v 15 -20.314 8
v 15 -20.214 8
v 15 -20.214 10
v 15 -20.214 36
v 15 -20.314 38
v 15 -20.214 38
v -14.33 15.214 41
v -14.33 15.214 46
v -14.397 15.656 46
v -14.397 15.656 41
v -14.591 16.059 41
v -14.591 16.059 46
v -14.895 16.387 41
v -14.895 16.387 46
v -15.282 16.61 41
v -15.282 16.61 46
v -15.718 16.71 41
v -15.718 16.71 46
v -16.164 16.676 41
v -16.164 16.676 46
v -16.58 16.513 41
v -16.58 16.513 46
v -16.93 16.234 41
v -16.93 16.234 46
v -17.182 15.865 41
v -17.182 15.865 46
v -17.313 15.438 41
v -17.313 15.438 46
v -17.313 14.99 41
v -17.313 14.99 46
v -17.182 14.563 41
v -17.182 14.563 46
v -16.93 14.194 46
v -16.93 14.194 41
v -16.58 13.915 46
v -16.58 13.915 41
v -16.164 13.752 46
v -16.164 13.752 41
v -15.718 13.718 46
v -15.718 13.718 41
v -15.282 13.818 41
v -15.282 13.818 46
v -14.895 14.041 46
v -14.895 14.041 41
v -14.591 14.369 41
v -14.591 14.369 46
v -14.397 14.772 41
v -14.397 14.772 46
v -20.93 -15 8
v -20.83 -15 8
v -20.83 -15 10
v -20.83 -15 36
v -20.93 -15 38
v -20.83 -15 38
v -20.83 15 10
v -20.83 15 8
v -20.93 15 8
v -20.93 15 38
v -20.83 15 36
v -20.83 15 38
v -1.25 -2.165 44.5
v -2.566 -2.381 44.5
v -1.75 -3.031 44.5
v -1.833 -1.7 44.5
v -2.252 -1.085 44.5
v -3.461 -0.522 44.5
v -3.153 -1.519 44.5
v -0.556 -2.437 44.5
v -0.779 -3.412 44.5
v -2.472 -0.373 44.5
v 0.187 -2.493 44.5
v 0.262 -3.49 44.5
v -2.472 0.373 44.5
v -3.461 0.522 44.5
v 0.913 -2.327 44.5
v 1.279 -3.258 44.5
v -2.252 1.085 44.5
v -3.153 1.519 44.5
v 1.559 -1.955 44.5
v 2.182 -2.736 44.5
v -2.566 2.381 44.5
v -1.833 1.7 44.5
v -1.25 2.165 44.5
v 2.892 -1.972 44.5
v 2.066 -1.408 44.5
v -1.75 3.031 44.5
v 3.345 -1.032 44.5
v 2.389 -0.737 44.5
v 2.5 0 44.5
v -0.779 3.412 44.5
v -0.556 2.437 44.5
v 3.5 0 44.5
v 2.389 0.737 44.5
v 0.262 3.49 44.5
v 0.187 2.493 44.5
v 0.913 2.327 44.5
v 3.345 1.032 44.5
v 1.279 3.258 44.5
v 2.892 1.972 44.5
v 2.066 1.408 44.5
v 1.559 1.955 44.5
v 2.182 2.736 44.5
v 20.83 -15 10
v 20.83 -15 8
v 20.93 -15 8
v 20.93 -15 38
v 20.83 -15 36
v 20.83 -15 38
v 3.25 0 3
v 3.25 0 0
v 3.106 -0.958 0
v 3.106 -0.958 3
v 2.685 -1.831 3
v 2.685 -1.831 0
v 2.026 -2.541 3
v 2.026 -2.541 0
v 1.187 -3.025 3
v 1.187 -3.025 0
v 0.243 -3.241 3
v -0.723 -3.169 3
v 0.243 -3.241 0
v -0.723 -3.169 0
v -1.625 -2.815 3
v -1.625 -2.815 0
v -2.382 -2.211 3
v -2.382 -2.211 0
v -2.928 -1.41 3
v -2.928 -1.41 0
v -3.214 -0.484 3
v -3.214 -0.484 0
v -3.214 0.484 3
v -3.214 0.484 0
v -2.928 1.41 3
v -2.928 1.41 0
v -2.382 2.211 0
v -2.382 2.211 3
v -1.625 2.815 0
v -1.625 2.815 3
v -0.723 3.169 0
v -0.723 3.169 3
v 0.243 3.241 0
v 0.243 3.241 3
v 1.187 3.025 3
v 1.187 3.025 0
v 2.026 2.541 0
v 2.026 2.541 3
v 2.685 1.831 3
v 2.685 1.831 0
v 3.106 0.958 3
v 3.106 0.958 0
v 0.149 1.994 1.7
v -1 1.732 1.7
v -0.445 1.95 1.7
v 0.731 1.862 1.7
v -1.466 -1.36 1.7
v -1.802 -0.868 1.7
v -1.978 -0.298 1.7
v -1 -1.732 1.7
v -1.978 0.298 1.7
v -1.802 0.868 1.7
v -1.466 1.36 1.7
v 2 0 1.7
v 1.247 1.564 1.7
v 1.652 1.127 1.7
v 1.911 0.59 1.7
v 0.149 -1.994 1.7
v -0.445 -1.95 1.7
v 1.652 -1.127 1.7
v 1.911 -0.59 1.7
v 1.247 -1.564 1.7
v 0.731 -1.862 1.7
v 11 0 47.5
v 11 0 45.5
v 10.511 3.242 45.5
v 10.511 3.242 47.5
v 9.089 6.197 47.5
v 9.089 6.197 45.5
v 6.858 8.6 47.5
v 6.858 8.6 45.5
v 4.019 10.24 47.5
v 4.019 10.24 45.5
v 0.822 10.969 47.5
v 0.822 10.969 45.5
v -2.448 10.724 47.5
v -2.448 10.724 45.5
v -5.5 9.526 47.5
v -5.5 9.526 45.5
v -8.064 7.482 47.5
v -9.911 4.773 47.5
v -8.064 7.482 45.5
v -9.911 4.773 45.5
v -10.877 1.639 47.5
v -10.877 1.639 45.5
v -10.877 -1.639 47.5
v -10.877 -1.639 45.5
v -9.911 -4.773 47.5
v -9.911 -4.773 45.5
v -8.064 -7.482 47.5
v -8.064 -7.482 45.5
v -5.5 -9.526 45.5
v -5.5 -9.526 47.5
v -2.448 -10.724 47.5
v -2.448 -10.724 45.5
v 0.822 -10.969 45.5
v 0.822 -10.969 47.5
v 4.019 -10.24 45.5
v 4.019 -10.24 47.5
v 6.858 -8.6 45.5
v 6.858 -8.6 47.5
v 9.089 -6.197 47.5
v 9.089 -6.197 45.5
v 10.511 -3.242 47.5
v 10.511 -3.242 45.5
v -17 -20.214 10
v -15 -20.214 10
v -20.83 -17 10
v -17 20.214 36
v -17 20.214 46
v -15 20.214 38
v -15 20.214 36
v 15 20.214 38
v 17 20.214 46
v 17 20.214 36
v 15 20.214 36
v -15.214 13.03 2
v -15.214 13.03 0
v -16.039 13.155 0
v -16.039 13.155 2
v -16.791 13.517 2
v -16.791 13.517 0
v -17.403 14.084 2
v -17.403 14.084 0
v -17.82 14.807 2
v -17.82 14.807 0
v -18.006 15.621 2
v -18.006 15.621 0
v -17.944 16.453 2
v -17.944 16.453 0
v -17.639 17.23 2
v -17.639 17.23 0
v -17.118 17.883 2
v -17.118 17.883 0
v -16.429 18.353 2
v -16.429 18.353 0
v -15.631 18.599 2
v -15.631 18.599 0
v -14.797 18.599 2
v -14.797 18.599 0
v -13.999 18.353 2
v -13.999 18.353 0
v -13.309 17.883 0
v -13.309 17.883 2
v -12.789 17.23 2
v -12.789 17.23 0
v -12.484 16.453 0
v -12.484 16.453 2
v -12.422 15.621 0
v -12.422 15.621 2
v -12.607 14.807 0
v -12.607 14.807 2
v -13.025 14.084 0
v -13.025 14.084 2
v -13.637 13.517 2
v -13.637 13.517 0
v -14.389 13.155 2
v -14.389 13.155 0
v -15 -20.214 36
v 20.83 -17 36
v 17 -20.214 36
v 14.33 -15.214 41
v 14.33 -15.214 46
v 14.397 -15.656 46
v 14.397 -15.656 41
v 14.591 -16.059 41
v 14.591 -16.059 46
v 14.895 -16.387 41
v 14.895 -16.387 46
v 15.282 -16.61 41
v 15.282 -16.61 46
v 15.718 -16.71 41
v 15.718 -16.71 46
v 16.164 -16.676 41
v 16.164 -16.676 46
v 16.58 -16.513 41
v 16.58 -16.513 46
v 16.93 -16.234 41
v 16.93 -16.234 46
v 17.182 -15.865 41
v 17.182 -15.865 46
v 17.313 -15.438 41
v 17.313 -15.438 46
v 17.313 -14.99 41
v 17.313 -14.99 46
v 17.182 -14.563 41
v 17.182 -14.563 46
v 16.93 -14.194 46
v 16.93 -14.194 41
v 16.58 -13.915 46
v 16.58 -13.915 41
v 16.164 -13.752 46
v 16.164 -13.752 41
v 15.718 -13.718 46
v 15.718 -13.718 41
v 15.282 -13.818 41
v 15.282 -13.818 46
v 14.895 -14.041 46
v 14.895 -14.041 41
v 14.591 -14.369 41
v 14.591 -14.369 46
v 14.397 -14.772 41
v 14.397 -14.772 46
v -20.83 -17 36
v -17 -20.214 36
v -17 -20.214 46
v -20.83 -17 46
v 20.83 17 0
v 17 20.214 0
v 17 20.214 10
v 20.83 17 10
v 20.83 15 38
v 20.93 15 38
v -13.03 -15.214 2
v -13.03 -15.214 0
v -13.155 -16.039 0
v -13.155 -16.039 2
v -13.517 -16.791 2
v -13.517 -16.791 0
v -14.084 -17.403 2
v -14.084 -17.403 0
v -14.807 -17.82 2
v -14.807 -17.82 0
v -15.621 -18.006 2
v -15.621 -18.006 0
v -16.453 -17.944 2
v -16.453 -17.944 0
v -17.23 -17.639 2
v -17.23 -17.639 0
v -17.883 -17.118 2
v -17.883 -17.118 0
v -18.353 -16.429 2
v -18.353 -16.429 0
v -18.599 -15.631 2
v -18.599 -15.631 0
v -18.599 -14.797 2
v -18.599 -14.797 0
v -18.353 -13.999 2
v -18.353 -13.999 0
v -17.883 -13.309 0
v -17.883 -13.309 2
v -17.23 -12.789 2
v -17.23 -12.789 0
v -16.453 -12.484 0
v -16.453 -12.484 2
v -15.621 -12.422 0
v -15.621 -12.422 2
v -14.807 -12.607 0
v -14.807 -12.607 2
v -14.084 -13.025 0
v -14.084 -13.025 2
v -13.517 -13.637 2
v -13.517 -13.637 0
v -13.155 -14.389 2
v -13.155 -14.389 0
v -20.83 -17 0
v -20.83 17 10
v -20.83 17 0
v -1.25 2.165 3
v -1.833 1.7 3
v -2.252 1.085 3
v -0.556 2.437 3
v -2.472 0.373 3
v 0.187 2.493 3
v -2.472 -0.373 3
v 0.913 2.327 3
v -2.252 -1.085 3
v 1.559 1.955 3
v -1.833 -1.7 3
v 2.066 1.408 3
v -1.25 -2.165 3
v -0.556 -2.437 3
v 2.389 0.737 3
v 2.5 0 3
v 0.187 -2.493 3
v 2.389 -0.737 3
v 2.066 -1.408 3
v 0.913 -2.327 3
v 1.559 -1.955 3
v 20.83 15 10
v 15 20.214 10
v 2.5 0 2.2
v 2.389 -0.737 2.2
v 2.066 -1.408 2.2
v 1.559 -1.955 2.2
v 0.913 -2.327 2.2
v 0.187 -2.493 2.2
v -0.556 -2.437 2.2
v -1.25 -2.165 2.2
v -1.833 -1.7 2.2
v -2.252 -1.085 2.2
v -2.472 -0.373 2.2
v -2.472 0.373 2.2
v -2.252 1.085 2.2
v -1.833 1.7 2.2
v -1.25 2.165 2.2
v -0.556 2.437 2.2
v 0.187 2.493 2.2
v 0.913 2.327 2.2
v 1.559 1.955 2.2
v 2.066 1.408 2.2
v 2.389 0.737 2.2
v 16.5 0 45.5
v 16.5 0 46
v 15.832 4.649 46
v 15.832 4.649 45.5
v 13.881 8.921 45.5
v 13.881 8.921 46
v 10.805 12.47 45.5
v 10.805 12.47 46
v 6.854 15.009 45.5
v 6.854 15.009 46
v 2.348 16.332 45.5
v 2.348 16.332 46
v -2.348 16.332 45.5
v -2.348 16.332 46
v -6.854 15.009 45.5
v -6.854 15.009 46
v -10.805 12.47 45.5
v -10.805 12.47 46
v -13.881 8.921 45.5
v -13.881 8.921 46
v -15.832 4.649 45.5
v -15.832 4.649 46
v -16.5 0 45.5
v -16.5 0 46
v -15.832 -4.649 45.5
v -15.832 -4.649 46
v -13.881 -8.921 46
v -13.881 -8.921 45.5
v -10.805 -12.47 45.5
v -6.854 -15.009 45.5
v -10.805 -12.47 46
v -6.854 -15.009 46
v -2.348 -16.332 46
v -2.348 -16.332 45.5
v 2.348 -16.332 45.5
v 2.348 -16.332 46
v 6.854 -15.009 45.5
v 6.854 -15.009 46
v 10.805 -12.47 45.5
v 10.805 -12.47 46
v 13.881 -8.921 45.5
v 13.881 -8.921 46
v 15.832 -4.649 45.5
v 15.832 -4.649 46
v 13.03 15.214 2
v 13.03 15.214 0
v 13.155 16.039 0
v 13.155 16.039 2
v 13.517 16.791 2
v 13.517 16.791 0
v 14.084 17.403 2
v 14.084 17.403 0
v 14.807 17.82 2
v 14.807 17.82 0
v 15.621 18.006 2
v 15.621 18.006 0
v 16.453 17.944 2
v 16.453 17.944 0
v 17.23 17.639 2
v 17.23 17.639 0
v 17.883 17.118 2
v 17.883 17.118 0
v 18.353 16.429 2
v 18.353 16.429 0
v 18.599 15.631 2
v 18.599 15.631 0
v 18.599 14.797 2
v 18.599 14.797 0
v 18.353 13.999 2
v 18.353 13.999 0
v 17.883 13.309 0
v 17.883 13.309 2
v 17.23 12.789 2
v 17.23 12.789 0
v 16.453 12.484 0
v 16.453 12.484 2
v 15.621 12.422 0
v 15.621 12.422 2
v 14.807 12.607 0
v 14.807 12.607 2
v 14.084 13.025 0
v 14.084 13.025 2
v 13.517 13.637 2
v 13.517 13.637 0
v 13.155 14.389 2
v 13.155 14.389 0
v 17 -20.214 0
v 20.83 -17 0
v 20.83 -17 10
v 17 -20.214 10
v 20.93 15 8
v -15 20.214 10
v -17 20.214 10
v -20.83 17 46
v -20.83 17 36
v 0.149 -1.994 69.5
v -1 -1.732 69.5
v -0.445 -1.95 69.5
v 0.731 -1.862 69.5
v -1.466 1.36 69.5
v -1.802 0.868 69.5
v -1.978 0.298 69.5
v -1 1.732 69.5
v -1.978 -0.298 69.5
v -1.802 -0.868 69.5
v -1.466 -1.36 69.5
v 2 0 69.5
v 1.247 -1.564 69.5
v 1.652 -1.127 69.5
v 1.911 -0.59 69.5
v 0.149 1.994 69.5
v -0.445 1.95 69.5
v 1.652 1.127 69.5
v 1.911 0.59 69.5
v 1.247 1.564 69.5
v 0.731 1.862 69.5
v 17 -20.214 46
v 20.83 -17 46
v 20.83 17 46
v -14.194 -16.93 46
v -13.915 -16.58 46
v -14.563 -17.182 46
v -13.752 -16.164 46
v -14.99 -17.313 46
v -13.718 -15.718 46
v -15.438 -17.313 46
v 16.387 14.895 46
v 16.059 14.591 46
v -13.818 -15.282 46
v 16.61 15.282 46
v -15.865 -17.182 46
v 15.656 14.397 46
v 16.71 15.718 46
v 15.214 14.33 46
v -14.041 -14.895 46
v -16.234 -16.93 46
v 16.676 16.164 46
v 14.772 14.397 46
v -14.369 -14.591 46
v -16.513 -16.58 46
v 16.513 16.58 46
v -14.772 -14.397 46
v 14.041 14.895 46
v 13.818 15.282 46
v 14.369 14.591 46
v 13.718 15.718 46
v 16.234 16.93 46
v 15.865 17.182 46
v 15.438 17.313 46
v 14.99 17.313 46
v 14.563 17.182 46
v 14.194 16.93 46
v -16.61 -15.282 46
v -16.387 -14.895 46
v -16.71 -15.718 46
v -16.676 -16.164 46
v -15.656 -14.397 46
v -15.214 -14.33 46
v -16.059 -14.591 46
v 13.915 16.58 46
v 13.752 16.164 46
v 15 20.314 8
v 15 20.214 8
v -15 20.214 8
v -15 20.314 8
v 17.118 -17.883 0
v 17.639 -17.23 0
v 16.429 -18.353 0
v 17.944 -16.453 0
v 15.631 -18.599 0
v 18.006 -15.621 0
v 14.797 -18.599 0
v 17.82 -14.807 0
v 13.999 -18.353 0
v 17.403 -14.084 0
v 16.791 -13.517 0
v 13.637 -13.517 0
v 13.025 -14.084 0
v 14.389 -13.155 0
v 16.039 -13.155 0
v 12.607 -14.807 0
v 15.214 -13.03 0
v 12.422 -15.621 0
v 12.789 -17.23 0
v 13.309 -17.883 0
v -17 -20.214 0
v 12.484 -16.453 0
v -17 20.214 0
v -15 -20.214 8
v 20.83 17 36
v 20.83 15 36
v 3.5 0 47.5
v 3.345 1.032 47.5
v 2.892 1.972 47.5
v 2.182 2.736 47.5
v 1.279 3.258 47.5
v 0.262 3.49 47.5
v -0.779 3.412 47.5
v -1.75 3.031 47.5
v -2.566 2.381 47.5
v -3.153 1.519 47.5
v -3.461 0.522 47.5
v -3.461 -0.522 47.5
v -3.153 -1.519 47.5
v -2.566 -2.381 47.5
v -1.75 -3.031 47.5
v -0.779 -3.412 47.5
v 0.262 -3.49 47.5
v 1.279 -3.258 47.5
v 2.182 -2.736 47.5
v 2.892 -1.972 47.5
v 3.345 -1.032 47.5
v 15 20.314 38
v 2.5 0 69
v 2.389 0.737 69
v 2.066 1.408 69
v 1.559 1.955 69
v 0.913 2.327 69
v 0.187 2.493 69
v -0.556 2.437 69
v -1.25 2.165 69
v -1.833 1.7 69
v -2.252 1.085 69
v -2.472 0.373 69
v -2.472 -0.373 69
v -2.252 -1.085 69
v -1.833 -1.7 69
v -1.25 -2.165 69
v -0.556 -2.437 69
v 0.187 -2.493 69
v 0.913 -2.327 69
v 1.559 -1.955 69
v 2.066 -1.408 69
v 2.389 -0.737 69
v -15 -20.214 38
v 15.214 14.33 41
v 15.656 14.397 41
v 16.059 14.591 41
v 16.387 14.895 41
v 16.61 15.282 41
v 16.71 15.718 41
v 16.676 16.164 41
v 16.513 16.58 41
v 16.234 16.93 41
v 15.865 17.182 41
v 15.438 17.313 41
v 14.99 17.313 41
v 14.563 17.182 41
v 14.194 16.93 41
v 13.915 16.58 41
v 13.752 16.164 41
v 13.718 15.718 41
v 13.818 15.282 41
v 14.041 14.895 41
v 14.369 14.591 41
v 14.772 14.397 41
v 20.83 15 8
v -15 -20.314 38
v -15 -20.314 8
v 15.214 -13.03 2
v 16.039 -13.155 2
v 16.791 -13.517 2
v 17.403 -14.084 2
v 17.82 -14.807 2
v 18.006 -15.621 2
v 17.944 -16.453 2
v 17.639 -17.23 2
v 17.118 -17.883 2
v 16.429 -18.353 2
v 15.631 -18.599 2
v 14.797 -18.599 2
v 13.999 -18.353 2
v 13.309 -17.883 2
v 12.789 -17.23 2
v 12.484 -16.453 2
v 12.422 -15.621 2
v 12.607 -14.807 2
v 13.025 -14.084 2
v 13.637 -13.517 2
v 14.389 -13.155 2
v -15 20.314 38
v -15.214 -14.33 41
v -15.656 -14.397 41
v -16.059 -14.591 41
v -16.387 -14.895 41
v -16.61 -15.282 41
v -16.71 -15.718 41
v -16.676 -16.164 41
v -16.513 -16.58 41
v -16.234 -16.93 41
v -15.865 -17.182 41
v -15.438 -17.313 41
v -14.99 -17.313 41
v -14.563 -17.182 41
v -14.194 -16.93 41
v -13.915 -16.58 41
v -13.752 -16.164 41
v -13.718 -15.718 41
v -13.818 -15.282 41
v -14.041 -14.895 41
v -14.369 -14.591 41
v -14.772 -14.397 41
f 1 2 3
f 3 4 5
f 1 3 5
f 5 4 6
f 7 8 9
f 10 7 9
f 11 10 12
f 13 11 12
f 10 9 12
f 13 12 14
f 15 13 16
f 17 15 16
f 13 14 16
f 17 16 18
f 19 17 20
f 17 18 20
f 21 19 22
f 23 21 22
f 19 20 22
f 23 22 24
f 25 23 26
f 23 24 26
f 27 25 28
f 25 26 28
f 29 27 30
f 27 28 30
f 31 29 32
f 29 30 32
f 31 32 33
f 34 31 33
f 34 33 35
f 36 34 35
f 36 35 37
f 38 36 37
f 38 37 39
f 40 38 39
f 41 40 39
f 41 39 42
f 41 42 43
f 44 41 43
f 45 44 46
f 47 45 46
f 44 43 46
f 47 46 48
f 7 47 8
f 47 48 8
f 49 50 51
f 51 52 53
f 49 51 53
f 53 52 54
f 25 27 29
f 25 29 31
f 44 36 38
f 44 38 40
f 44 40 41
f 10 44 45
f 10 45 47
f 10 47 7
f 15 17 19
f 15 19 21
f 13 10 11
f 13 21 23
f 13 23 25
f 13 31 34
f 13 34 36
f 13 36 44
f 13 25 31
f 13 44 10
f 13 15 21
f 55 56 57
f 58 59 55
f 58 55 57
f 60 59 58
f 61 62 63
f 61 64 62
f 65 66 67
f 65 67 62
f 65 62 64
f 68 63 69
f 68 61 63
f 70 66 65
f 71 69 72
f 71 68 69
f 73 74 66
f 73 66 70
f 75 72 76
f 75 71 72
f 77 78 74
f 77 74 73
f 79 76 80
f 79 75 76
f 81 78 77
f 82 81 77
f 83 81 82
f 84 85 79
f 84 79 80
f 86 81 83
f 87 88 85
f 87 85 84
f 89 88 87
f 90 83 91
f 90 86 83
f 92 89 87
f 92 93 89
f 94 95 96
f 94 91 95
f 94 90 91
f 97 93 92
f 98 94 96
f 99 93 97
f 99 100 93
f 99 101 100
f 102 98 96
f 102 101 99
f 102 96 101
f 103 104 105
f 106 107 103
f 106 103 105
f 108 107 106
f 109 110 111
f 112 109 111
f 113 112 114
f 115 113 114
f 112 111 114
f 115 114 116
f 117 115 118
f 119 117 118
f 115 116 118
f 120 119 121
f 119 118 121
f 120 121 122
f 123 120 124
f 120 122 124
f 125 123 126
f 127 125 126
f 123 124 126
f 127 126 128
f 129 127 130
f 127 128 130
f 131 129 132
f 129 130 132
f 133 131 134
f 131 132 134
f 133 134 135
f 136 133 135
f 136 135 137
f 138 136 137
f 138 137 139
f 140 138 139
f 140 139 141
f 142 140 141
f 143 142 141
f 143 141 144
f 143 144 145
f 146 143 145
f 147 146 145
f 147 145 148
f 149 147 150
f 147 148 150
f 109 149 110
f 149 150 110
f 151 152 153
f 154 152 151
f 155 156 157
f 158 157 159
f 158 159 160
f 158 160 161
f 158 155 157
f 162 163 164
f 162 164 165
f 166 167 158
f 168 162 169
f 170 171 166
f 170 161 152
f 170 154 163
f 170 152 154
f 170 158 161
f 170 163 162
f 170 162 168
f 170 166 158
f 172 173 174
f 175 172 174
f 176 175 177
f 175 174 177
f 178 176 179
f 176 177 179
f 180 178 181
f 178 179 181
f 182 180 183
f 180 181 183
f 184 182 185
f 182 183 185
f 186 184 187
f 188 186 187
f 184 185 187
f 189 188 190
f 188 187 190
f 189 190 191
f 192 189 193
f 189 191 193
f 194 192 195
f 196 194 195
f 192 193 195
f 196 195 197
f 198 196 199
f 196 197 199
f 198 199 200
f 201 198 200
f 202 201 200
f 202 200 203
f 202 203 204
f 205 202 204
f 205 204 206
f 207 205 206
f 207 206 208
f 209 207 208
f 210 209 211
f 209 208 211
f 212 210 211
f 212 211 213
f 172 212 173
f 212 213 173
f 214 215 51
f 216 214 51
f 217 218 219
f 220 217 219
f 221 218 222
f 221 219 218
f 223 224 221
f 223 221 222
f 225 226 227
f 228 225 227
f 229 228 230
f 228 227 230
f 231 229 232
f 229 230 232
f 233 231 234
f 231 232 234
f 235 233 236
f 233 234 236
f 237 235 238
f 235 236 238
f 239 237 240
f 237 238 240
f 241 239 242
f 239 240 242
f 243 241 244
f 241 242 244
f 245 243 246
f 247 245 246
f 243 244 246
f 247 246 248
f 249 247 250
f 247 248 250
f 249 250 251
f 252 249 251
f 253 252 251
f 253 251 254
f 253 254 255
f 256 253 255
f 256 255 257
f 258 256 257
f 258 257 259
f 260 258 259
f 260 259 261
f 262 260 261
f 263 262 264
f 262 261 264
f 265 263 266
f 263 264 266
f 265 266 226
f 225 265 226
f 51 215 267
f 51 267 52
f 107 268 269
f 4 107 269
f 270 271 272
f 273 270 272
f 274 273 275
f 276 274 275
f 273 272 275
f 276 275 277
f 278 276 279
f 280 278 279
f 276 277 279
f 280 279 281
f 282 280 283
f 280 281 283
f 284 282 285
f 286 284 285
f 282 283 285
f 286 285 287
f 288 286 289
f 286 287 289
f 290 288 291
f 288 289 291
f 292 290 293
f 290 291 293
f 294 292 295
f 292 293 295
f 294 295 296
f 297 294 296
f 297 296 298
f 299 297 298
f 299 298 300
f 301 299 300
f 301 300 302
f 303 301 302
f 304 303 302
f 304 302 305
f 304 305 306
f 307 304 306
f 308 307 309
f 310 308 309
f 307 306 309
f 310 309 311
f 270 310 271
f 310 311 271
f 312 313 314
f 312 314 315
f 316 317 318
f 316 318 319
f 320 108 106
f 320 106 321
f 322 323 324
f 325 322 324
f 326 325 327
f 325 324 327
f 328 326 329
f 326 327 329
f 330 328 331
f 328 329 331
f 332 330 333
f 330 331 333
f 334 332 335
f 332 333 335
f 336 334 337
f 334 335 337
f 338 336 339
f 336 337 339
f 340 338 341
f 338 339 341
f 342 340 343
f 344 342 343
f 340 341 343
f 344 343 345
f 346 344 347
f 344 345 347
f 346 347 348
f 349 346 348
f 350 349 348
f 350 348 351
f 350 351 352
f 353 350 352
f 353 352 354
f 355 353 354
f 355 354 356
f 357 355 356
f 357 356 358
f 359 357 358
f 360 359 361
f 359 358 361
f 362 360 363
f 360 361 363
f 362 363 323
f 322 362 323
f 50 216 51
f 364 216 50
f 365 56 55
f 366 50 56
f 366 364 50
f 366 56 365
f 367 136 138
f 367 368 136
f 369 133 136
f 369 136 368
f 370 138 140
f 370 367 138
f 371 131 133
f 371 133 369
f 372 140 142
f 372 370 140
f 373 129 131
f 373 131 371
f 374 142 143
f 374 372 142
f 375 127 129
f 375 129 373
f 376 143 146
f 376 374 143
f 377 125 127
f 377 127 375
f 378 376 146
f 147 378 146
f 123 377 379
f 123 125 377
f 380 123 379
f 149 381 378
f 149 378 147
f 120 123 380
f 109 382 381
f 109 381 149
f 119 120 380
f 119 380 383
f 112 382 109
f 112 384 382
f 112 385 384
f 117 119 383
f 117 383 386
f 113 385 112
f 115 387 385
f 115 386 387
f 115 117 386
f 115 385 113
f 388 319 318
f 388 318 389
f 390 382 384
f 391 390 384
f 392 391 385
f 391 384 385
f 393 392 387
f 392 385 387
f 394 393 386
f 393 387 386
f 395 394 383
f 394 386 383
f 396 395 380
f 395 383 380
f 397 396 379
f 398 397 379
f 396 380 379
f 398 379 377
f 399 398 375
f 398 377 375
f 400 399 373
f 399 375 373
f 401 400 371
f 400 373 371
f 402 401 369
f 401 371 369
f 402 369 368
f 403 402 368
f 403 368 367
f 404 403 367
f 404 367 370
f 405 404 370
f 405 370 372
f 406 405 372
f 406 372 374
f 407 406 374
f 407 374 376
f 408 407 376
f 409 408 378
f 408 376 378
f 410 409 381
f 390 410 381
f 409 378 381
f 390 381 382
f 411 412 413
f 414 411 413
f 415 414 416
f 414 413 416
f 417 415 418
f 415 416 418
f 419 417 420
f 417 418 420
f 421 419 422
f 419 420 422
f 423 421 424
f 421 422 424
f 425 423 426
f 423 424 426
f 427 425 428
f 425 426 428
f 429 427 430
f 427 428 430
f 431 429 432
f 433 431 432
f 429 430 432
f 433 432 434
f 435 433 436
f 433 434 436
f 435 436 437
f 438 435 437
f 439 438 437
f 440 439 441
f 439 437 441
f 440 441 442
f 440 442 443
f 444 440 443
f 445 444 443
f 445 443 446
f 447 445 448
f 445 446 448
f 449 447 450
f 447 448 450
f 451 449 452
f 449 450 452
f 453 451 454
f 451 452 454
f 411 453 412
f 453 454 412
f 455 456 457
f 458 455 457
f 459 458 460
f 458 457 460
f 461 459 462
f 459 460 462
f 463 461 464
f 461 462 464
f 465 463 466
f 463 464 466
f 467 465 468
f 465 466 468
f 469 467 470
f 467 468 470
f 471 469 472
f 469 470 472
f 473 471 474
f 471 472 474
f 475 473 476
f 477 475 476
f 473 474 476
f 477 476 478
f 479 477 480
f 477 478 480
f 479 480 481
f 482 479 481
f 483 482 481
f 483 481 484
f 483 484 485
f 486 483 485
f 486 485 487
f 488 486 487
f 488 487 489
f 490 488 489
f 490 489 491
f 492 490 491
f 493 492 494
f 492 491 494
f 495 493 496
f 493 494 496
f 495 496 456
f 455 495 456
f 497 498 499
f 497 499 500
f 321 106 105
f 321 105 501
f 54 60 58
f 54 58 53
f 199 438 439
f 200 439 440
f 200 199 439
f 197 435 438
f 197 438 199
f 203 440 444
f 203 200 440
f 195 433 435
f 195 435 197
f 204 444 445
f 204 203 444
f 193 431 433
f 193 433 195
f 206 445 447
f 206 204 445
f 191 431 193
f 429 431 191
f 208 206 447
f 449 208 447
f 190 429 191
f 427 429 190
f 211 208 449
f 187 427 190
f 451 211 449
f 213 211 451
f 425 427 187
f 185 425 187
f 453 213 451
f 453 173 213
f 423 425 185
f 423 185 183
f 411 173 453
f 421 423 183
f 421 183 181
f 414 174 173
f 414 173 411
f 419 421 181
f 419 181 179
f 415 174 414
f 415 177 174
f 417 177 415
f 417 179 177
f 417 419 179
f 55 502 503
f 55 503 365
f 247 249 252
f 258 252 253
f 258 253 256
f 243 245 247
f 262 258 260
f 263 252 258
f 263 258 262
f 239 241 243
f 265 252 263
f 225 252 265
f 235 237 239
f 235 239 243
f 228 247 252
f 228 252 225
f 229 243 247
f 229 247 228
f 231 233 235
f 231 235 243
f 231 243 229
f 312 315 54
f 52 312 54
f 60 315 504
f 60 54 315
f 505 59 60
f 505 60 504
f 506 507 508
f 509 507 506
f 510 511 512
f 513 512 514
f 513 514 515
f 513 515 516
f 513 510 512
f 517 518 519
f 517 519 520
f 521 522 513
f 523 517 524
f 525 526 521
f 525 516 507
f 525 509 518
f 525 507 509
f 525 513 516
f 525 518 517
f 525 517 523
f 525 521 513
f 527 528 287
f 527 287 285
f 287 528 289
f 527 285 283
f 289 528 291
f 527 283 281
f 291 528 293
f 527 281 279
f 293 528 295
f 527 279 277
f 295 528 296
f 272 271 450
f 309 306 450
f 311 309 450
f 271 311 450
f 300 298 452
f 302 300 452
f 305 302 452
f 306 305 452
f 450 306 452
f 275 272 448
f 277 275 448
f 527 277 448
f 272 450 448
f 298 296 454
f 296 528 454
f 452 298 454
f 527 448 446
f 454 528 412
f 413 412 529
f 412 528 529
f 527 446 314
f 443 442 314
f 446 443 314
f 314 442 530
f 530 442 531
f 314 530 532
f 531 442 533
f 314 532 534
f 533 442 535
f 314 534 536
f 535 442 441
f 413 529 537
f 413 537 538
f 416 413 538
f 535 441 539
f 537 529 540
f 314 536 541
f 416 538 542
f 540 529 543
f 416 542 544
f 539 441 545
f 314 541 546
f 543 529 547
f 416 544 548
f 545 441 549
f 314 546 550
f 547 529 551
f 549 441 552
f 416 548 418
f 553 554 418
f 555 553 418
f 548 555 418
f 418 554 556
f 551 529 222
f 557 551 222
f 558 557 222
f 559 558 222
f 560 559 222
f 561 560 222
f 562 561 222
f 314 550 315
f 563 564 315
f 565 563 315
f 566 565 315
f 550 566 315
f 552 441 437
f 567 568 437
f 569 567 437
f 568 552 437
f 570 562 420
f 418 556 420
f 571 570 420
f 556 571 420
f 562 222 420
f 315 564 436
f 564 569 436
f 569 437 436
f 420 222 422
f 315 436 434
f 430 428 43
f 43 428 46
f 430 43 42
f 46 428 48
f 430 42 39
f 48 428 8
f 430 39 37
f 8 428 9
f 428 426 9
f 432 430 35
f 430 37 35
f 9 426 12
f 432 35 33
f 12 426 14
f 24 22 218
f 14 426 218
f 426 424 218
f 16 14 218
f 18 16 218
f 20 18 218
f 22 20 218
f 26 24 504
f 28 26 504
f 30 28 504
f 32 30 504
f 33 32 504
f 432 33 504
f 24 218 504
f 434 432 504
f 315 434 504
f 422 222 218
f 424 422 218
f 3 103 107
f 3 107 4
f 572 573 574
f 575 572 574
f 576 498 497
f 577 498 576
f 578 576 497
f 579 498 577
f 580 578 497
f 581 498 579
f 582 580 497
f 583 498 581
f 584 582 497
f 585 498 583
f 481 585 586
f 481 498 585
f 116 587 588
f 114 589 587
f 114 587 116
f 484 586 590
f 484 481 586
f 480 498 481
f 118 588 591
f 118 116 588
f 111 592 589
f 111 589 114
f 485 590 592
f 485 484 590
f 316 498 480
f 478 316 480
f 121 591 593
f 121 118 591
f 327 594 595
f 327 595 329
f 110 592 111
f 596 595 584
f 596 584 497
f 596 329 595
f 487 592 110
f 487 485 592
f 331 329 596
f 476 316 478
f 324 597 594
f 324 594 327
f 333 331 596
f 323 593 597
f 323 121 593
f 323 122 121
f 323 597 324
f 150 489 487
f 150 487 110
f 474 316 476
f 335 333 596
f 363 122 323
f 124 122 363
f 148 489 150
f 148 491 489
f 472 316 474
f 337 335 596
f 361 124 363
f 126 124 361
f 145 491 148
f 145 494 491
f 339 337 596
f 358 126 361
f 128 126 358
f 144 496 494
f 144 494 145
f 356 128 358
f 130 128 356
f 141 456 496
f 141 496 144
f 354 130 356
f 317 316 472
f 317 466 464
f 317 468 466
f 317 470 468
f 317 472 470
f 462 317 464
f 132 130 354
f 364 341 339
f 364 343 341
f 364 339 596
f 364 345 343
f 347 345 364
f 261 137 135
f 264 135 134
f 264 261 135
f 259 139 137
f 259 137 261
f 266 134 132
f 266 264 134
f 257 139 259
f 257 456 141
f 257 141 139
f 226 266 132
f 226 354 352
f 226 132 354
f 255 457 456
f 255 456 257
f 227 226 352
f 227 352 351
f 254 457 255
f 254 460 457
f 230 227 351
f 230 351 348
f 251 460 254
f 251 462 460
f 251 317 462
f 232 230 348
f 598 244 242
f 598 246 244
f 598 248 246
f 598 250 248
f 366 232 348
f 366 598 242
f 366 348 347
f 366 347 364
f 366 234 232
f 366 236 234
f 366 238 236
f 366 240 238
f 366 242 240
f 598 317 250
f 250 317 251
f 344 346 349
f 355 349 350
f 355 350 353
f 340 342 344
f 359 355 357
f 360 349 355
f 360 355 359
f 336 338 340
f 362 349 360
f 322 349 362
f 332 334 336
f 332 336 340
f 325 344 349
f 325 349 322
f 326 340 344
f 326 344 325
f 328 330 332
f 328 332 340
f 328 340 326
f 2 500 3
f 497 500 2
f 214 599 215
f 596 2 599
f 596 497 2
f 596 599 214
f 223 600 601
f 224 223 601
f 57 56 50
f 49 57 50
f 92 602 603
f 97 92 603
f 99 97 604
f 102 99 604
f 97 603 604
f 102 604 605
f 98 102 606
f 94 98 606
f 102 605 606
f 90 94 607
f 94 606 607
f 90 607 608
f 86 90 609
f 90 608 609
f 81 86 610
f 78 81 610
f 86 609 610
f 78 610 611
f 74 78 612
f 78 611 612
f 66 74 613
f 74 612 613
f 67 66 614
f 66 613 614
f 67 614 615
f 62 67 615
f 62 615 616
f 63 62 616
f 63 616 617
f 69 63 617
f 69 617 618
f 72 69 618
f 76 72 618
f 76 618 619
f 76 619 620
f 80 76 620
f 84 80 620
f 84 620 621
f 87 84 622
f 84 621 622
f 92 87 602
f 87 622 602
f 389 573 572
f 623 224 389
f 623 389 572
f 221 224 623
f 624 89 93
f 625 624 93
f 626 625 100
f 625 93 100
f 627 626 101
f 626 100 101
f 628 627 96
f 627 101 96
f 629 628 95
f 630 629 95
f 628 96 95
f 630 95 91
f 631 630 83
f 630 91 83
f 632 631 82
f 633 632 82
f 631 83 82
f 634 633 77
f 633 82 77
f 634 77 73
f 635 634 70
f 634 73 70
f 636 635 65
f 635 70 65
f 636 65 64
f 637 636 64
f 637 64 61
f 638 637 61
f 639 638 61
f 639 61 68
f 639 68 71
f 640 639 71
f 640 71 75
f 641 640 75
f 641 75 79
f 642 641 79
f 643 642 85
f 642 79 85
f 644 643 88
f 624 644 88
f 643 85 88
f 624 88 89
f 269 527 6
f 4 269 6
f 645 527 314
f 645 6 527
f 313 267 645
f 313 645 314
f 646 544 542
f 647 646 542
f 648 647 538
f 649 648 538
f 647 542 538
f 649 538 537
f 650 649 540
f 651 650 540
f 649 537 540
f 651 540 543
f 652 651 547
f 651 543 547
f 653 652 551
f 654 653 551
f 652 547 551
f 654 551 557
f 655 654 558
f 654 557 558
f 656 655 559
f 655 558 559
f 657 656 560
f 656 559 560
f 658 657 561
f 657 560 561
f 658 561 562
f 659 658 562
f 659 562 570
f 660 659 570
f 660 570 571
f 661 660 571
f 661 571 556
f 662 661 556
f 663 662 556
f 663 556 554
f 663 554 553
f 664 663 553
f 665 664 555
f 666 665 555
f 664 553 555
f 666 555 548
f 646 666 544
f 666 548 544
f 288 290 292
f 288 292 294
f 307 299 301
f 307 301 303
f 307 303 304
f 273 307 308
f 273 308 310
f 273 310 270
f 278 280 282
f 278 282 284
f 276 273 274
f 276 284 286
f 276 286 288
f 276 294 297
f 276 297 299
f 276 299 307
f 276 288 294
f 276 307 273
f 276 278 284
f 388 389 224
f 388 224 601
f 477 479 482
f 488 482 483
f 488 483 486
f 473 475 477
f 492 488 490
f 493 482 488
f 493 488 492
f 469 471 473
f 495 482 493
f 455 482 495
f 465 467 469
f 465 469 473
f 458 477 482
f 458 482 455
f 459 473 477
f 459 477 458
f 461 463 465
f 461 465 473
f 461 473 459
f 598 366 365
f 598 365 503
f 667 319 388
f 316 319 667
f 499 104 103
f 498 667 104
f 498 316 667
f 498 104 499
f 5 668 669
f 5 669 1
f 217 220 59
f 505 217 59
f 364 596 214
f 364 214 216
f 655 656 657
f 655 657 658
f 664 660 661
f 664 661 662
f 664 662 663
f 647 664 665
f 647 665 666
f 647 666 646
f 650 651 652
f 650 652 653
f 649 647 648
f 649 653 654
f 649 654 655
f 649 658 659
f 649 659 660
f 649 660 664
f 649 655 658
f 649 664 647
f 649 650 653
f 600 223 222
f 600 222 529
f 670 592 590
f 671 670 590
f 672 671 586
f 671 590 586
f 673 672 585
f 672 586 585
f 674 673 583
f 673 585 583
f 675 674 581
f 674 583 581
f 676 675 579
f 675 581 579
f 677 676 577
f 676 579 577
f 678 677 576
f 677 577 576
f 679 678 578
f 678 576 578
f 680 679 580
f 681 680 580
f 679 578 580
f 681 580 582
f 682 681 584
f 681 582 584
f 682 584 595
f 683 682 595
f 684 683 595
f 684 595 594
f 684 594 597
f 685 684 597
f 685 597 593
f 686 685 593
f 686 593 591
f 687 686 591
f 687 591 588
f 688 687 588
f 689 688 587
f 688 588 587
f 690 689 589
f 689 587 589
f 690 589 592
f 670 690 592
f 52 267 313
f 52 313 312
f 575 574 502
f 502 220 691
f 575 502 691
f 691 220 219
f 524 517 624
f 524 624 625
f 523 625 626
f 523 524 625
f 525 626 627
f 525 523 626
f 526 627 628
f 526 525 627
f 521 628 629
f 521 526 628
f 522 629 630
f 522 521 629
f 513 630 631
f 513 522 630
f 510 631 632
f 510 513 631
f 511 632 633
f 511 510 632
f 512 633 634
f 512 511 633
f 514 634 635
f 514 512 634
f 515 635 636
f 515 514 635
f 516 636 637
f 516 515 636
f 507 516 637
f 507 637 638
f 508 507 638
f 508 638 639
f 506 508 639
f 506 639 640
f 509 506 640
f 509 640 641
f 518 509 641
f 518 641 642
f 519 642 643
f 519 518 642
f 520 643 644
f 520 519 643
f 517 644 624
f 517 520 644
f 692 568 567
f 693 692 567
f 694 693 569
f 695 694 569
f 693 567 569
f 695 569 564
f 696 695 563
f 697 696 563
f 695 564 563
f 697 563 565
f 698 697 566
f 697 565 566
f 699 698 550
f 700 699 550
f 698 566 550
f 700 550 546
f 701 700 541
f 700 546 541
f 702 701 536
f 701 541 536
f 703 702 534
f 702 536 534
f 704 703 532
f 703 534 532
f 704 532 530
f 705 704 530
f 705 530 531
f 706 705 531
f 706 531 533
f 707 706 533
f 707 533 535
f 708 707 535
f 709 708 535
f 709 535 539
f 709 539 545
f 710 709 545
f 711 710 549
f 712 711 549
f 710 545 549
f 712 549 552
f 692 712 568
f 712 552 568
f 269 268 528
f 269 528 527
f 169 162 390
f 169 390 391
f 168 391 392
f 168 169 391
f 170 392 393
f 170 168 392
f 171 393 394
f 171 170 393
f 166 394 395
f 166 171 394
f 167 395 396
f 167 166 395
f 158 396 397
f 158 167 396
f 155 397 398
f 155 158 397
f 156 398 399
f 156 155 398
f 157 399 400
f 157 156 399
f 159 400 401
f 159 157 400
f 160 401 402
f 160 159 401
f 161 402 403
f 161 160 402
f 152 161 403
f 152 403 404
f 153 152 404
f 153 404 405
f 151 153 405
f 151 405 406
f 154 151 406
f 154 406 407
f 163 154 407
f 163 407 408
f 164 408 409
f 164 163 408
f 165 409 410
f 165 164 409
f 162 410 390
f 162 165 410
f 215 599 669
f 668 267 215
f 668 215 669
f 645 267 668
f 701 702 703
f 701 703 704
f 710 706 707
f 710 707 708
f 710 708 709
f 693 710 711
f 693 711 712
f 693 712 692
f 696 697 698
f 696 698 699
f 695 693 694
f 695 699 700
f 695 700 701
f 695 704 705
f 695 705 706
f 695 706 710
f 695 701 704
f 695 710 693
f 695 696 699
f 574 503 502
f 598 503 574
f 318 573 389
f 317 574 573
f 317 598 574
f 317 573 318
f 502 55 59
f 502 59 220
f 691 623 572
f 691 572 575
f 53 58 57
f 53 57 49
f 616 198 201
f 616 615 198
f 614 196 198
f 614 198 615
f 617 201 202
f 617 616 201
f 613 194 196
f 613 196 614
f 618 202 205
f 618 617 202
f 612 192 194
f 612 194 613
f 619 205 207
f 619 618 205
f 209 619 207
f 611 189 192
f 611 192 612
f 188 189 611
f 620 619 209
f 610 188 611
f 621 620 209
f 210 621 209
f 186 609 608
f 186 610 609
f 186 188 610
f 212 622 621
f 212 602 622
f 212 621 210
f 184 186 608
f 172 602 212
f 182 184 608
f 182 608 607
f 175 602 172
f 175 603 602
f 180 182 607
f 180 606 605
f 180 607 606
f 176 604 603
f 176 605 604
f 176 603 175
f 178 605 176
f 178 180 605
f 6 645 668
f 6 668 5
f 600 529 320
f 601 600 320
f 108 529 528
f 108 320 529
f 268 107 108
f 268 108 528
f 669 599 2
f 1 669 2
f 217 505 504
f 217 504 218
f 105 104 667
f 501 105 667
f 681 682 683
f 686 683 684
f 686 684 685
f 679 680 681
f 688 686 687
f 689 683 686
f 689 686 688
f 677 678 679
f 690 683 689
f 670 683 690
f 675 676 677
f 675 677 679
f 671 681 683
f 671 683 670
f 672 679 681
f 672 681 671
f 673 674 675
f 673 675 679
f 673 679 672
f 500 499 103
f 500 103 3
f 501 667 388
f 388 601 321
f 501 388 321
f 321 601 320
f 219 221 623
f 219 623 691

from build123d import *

# Parameters (mm, degrees)
PAD_DEPTH             = 10
POCKET_DEPTH          = 2
PAD001_DEPTH          = 28
PAD002_DEPTH          = 10
SKETCH004_R           = 16.5
POCKET001_DEPTH       = 0.5
SKETCH005_R           = 11
PAD003_DEPTH          = 2
SKETCH006_R           = 3.5
POCKET002_DEPTH       = 3
SKETCH007_R           = 1.5
POCKET003_DEPTH       = 5
POLARPATTERN_COUNT    = 4
SKETCH008_R           = 2.8
POCKET004_DEPTH       = 2
POLARPATTERN001_COUNT = 4
SKETCH009_R           = 3.25
POCKET005_DEPTH       = 3
SKETCH010_R           = 2.5
PAD004_DEPTH          = 1.3
CHAMFER_SIZE          = 0.5
SKETCH011_R           = 2.5
PAD005_DEPTH          = 25
CHAMFER001_SIZE       = 0.5
SKETCH012_W           = 30
SKETCH012_H           = 30
PAD006_DEPTH          = 0.1
POLARPATTERN002_COUNT = 2
SKETCH013_W           = 30
SKETCH013_H           = 30
PAD007_DEPTH          = 0.1
POLARPATTERN003_COUNT = 2


with BuildPart() as part:
    # Sketch → Pad (new body)
    with BuildSketch(Plane.XY):
        Polygon((-17, 20.213938), (17, 20.213938), (20.830222, 17), (20.830222, -17), (17, -20.213938), (-17, -20.213938), (-20.830222, -17), (-20.830222, 17), align=None)
    extrude(amount=PAD_DEPTH)

    # Sketch001 (on Face10 of Pad) → Pocket (cut)
    with BuildSketch(Plane.XY.offset(10)):
        Polygon((-20.830222, 15), (-15, 20.213938), (15, 20.213938), (20.830222, 15), (20.830222, -15), (15, -20.213938), (-15, -20.213938), (-20.830222, -15), align=None)
    extrude(amount=-POCKET_DEPTH, mode=Mode.SUBTRACT)

    # Sketch002 (on Face6 of Pocket) → Pad001 (join)
    with BuildSketch(Plane.XY.offset(8)):
        Polygon((-20.830222, 15), (-15, 20.213938), (15, 20.213938), (20.830222, 15), (20.830222, -15), (15, -20.213938), (-15, -20.213938), (-20.830222, -15), align=None)
    extrude(amount=PAD001_DEPTH)

    # Sketch003 (on Face12 of Pad001) → Pad002 (join)
    with BuildSketch(Plane.XY.offset(36)):
        Polygon((-20.830222, 17), (-17, 20.213938), (17, 20.213938), (20.830222, 17), (20.830222, -17), (17, -20.213938), (-17, -20.213938), (-20.830222, -17), align=None)
    extrude(amount=PAD002_DEPTH)

    # Sketch004 (on Face17 of Pad002) → Pocket001 (cut)
    with BuildSketch(Plane.XY.offset(46)):
        Circle(SKETCH004_R)
    extrude(amount=-POCKET001_DEPTH, mode=Mode.SUBTRACT)

    # Sketch005 (on Face28 of Pocket001) → Pad003 (join)
    with BuildSketch(Plane.XY.offset(45.5)):
        Circle(SKETCH005_R)
    extrude(amount=PAD003_DEPTH)

    # Sketch006 (on Face30 of Pad003) → Pocket002 (cut)
    with BuildSketch(Plane.XY.offset(47.5)):
        Circle(SKETCH006_R)
    extrude(amount=-POCKET002_DEPTH, mode=Mode.SUBTRACT)

    # Sketch007 (on Face14 of Pocket002) → Pocket003 (cut)
    with BuildSketch(Plane.XY.offset(46)):
        with Locations((-15.830222, 15.213938)):
            Circle(SKETCH007_R)
    pocket003 = extrude(amount=-POCKET003_DEPTH, mode=Mode.SUBTRACT)

    # PolarPattern: Pocket003 ×4 about axis
    polarpattern_axis = Axis((0, 0, 46), (0, 0, 1))
    for i in range(1, POLARPATTERN_COUNT):
        add(pocket003.rotate(polarpattern_axis, i * 360 / POLARPATTERN_COUNT), mode=Mode.SUBTRACT)

    # Sketch008 (on Face1 of PolarPattern) → Pocket004 (cut)
    with BuildSketch(Plane(origin=(0, 0, 0), x_dir=(1, 0, 0), z_dir=(0, 0, -1))):
        with Locations((-15.830222, 15.213938)):
            Circle(SKETCH008_R)
    pocket004 = extrude(amount=-POCKET004_DEPTH, mode=Mode.SUBTRACT)

    # PolarPattern001: Pocket004 ×4 about axis
    polarpattern001_axis = Axis((0, 0, 0), (0, 0, -1))
    for i in range(1, POLARPATTERN001_COUNT):
        add(pocket004.rotate(polarpattern001_axis, i * 360 / POLARPATTERN001_COUNT), mode=Mode.SUBTRACT)

    # Sketch009 (on Face1 of PolarPattern001) → Pocket005 (cut)
    with BuildSketch(Plane(origin=(0, 0, 0), x_dir=(1, 0, 0), z_dir=(0, 0, -1))):
        Circle(SKETCH009_R)
    extrude(amount=-POCKET005_DEPTH, mode=Mode.SUBTRACT)

    # Sketch010 (on Face33 of Pocket005) → Pad004 (join)
    with BuildSketch(Plane(origin=(0, 0, 3), x_dir=(1, 0, 0), z_dir=(0, 0, -1))):
        Circle(SKETCH010_R)
    extrude(amount=PAD004_DEPTH)

    # Chamfer
    chamfer_edges = [part.edges().sort_by_distance(p)[0] for p in [
        (-2.5, 0, 1.7),
    ]]
    chamfer(chamfer_edges, length=CHAMFER_SIZE)

    # Sketch011 (on Face53 of Chamfer) → Pad005 (join)
    with BuildSketch(Plane.XY.offset(44.5)):
        Circle(SKETCH011_R)
    extrude(amount=PAD005_DEPTH)

    # Chamfer001
    chamfer001_edges = [part.edges().sort_by_distance(p)[0] for p in [
        (-2.5, 0, 69.5),
    ]]
    chamfer(chamfer001_edges, length=CHAMFER001_SIZE)

    # Sketch012 (on Face16 of Chamfer001) → Pad006 (join)
    with BuildSketch(Plane.XZ.offset(20.213938)):
        with Locations((0, 23)):
            Rectangle(SKETCH012_W, SKETCH012_H)
    pad006 = extrude(amount=PAD006_DEPTH)

    # PolarPattern002: Pad006 ×2 about axis
    polarpattern002_axis = Axis((0, 0, 0), (0, 0, -1))
    for i in range(1, POLARPATTERN002_COUNT):
        add(pad006.rotate(polarpattern002_axis, i * 360 / POLARPATTERN002_COUNT))

    # Sketch013 (on Face17 of PolarPattern002) → Pad007 (join)
    with BuildSketch(Plane.YZ.offset(20.830222)):
        with Locations((0, 23)):
            Rectangle(SKETCH013_W, SKETCH013_H)
    pad007 = extrude(amount=PAD007_DEPTH)

    # PolarPattern003: Pad007 ×2 about axis
    polarpattern003_axis = Axis((0, 0, 0), (0, 0, 1))
    for i in range(1, POLARPATTERN003_COUNT):
        add(pad007.rotate(polarpattern003_axis, i * 360 / POLARPATTERN003_COUNT))


solid = part.part
